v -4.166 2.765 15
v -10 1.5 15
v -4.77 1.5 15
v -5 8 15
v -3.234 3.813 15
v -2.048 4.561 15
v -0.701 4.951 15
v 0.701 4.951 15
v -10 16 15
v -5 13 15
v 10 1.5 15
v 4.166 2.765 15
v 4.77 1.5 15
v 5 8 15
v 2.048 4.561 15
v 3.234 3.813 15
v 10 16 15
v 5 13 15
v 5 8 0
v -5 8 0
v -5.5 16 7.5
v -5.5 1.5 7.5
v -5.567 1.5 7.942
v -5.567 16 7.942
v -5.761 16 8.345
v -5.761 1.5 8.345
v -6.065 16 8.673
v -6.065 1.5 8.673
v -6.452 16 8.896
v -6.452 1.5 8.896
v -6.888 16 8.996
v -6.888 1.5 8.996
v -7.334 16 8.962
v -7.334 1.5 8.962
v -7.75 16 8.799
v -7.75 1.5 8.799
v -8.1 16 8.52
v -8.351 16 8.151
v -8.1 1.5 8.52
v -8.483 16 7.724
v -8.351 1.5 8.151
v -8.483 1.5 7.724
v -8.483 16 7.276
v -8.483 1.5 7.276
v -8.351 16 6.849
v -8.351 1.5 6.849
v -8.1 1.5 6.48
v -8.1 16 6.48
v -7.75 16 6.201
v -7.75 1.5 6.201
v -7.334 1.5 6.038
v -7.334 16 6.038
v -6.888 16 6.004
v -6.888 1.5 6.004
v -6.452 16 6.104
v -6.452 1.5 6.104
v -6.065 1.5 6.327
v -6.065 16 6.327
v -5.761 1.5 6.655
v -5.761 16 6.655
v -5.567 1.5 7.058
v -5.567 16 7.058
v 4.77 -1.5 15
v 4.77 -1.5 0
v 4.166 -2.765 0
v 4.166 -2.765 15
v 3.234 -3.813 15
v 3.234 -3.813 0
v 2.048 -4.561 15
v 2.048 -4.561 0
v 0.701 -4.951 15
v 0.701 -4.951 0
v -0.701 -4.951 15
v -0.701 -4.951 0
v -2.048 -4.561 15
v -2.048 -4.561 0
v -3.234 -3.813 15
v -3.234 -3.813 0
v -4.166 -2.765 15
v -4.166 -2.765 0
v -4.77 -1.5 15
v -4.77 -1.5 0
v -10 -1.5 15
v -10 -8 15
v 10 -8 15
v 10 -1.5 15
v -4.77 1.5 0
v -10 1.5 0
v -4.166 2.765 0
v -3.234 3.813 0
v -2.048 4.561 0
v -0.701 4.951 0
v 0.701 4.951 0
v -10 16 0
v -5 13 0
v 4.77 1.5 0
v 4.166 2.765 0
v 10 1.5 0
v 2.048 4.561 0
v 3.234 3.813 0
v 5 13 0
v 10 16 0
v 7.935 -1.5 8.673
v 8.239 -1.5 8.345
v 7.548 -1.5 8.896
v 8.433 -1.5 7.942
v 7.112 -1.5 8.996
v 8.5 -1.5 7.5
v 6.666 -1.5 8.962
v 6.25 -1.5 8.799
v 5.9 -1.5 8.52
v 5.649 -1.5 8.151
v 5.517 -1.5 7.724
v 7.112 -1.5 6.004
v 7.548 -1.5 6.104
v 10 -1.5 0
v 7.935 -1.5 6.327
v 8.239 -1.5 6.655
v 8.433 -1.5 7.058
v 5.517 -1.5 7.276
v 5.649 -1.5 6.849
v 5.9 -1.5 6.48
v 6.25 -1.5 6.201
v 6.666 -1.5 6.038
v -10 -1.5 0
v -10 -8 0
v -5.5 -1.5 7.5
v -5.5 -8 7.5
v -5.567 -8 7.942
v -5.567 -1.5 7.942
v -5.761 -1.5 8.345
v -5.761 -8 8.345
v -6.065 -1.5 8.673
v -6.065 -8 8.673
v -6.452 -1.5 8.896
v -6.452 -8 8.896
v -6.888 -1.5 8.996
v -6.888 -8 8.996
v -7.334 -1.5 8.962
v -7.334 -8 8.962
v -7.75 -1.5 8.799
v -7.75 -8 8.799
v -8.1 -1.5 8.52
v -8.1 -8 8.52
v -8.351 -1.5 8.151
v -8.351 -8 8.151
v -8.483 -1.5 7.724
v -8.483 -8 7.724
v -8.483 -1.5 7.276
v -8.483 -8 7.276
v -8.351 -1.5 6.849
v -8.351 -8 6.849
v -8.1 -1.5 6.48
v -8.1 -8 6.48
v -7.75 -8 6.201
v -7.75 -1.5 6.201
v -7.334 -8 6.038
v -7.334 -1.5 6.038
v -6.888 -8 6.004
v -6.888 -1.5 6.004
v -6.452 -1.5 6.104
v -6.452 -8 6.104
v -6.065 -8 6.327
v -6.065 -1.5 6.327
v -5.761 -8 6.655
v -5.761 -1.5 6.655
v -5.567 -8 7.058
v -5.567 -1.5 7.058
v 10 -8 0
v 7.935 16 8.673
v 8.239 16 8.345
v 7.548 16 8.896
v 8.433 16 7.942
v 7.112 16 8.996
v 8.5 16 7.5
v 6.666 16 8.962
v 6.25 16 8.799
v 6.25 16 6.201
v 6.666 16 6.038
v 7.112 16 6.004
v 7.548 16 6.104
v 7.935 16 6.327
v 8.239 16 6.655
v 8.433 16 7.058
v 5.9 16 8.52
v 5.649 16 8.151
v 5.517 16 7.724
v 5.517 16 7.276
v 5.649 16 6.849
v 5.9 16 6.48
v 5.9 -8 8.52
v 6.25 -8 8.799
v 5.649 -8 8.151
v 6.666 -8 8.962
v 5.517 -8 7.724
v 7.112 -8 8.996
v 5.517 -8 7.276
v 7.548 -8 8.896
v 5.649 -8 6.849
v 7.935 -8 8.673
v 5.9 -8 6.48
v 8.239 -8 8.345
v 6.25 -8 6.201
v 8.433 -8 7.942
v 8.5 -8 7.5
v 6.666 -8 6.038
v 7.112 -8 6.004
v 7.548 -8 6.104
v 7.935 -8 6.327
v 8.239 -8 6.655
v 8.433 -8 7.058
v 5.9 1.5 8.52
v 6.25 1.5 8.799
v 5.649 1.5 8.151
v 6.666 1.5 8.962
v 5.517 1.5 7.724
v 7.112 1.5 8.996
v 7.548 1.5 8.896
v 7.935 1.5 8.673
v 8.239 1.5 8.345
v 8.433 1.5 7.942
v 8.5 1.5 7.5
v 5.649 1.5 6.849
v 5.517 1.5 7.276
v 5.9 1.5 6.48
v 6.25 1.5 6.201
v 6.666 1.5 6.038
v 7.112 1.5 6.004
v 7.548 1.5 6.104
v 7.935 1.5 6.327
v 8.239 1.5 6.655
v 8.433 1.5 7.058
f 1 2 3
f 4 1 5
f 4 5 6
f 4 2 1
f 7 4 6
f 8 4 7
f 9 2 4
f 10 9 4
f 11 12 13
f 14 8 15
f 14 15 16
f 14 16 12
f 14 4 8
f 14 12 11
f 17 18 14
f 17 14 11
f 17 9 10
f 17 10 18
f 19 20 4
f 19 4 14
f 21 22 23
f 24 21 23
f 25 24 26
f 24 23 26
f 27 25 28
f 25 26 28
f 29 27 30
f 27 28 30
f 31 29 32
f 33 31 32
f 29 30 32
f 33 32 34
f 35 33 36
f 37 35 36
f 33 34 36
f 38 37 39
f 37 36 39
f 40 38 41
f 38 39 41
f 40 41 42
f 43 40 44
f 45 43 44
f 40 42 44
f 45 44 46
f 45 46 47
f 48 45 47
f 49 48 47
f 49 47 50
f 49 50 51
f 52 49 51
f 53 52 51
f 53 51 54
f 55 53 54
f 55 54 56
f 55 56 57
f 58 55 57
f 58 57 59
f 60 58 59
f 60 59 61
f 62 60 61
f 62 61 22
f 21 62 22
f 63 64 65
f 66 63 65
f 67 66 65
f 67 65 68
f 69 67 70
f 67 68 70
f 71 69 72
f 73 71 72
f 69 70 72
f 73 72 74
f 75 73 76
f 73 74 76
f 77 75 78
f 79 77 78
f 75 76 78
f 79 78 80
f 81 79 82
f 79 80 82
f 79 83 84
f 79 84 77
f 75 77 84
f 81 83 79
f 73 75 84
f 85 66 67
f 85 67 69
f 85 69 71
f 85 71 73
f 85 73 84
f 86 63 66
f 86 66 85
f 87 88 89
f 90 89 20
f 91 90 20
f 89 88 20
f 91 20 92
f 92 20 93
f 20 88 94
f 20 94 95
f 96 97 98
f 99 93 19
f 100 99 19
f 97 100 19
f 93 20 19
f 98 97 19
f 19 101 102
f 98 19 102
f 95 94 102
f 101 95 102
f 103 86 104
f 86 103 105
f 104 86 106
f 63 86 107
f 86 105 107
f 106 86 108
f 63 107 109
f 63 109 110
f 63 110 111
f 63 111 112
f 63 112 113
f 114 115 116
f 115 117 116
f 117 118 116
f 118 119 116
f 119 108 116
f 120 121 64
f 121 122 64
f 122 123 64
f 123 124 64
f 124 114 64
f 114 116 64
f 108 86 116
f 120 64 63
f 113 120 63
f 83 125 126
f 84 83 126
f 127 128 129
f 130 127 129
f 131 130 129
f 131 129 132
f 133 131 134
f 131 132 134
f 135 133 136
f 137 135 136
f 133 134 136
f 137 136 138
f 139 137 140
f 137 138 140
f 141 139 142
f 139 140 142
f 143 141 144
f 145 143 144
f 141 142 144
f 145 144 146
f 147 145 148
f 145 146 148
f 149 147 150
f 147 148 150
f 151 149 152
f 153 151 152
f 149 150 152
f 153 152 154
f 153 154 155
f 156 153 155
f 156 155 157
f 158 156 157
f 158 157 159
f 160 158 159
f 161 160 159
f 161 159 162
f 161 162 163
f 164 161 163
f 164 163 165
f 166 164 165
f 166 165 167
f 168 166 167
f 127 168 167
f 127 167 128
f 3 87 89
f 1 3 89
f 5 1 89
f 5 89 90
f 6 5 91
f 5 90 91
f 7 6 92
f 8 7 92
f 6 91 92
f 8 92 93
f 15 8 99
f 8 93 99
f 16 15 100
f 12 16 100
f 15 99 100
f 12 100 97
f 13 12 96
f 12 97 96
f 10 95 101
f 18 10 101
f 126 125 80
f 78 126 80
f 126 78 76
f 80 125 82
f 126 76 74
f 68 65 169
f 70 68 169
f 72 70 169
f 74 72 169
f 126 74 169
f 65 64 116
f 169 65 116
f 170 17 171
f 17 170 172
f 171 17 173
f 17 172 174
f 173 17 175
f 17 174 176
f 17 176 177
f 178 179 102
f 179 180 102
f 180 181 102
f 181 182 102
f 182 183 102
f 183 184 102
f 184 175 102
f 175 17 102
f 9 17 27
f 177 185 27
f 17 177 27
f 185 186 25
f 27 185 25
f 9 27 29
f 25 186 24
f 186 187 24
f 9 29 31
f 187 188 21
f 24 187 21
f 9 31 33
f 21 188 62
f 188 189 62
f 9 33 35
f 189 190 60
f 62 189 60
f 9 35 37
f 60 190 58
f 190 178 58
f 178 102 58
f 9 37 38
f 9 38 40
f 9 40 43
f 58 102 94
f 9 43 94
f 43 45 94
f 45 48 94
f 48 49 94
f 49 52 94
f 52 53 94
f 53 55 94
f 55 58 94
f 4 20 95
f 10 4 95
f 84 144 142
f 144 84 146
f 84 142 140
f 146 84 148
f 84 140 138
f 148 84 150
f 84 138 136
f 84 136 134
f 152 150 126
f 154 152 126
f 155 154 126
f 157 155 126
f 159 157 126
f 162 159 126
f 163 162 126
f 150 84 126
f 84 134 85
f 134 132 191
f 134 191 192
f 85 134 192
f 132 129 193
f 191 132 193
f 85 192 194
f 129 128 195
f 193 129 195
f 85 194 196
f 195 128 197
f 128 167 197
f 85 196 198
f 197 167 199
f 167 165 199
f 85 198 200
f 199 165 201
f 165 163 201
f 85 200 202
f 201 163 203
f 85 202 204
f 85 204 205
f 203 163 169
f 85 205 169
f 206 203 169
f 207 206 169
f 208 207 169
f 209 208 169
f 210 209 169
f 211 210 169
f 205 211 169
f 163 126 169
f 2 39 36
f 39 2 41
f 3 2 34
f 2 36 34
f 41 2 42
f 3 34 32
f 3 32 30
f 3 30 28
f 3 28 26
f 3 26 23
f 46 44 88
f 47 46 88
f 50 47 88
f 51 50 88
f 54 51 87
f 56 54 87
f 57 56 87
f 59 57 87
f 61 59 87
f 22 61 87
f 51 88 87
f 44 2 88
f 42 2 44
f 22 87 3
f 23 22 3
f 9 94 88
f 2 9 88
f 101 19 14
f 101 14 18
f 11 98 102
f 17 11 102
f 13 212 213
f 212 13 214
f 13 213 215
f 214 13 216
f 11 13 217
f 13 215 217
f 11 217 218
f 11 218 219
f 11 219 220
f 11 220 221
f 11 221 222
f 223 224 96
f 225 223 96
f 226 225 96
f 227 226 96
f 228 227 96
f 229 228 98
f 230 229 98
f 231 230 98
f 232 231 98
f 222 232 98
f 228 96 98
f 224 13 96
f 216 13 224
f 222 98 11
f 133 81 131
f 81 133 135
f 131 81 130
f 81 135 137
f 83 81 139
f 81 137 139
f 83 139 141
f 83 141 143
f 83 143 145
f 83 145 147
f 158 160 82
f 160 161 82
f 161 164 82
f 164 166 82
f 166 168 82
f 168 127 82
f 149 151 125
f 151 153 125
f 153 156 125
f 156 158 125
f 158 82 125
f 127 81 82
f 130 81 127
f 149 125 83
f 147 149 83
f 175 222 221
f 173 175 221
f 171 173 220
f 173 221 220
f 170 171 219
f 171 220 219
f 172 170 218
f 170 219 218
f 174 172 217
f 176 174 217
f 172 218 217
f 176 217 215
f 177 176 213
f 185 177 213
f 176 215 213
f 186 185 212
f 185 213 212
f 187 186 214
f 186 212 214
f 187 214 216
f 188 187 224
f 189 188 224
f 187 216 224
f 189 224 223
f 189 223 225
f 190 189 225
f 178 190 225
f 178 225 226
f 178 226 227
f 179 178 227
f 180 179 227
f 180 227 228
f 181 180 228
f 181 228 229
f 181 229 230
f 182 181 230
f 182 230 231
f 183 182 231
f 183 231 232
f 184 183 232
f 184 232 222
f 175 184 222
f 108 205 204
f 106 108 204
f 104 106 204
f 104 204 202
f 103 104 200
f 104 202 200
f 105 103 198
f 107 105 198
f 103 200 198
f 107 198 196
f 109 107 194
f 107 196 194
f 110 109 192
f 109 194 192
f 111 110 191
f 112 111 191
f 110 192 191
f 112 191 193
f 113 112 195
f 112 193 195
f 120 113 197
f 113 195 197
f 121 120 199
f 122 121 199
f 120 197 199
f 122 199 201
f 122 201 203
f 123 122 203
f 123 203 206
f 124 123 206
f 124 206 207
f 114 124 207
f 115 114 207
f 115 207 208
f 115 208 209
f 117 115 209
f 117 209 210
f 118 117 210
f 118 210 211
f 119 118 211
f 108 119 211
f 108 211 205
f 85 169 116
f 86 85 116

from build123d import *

# Parameters (mm, degrees)
SKETCH_1_W          = 10
SKETCH_1_H          = 5
EXTRUDE_1_DEPTH     = 15
EXTRUDE_1_2_DEPTH   = 15
SKETCH_2_R          = 1.5
CUT_EXTRUDE_1_DEPTH = 31.01666204


with BuildPart() as part:
    # 草图1 → 凸台-拉伸1 (new body)
    with BuildSketch(Plane.XY):
        with BuildLine():
            Line((-10, 1.5), (-4.769696007, 1.5))
            ThreePointArc((-4.769696007, 1.5), (0, 5), (4.769696007, 1.5))
            Line((4.769696007, 1.5), (10, 1.5))
            Line((10, 1.5), (10, 16))
            Line((10, 16), (-10, 16))
            Line((-10, 16), (-10, 1.5))
        make_face()
        with Locations((0, 10.5)):
            Rectangle(SKETCH_1_W, SKETCH_1_H, mode=Mode.SUBTRACT)
    extrude(amount=EXTRUDE_1_DEPTH)


with BuildPart() as body_2:
    # 草图1 → Extrude 1 2 (new body)
    with BuildSketch(Plane.XY):
        with BuildLine():
            Line((-10, -8), (10, -8))
            Line((10, -8), (10, -1.5))
            Line((10, -1.5), (4.769696007, -1.5))
            ThreePointArc((4.769696007, -1.5), (0, -5), (-4.769696007, -1.5))
            Line((-4.769696007, -1.5), (-10, -1.5))
            Line((-10, -1.5), (-10, -8))
        make_face()
    extrude(amount=EXTRUDE_1_2_DEPTH)


with BuildPart() as cut_extrude_1_tool:
    # 草图2 → 切除-拉伸1 (new, through all)
    with BuildSketch(Plane.XZ.offset(8)):
        with Locations((-7, 7.5)):
            Circle(SKETCH_2_R)
        with Locations((7, 7.5)):
            Circle(SKETCH_2_R)
    extrude(amount=-CUT_EXTRUDE_1_DEPTH)


with BuildPart() as part_1:
    add(part.part)

    # 切除-拉伸1: cut by cut_extrude_1_tool
    add(cut_extrude_1_tool.part, mode=Mode.SUBTRACT)


with BuildPart() as body_2_1:
    add(body_2.part)

    # 切除-拉伸1: cut by cut_extrude_1_tool
    add(cut_extrude_1_tool.part, mode=Mode.SUBTRACT)


solid = Compound([part_1.part, body_2_1.part])
